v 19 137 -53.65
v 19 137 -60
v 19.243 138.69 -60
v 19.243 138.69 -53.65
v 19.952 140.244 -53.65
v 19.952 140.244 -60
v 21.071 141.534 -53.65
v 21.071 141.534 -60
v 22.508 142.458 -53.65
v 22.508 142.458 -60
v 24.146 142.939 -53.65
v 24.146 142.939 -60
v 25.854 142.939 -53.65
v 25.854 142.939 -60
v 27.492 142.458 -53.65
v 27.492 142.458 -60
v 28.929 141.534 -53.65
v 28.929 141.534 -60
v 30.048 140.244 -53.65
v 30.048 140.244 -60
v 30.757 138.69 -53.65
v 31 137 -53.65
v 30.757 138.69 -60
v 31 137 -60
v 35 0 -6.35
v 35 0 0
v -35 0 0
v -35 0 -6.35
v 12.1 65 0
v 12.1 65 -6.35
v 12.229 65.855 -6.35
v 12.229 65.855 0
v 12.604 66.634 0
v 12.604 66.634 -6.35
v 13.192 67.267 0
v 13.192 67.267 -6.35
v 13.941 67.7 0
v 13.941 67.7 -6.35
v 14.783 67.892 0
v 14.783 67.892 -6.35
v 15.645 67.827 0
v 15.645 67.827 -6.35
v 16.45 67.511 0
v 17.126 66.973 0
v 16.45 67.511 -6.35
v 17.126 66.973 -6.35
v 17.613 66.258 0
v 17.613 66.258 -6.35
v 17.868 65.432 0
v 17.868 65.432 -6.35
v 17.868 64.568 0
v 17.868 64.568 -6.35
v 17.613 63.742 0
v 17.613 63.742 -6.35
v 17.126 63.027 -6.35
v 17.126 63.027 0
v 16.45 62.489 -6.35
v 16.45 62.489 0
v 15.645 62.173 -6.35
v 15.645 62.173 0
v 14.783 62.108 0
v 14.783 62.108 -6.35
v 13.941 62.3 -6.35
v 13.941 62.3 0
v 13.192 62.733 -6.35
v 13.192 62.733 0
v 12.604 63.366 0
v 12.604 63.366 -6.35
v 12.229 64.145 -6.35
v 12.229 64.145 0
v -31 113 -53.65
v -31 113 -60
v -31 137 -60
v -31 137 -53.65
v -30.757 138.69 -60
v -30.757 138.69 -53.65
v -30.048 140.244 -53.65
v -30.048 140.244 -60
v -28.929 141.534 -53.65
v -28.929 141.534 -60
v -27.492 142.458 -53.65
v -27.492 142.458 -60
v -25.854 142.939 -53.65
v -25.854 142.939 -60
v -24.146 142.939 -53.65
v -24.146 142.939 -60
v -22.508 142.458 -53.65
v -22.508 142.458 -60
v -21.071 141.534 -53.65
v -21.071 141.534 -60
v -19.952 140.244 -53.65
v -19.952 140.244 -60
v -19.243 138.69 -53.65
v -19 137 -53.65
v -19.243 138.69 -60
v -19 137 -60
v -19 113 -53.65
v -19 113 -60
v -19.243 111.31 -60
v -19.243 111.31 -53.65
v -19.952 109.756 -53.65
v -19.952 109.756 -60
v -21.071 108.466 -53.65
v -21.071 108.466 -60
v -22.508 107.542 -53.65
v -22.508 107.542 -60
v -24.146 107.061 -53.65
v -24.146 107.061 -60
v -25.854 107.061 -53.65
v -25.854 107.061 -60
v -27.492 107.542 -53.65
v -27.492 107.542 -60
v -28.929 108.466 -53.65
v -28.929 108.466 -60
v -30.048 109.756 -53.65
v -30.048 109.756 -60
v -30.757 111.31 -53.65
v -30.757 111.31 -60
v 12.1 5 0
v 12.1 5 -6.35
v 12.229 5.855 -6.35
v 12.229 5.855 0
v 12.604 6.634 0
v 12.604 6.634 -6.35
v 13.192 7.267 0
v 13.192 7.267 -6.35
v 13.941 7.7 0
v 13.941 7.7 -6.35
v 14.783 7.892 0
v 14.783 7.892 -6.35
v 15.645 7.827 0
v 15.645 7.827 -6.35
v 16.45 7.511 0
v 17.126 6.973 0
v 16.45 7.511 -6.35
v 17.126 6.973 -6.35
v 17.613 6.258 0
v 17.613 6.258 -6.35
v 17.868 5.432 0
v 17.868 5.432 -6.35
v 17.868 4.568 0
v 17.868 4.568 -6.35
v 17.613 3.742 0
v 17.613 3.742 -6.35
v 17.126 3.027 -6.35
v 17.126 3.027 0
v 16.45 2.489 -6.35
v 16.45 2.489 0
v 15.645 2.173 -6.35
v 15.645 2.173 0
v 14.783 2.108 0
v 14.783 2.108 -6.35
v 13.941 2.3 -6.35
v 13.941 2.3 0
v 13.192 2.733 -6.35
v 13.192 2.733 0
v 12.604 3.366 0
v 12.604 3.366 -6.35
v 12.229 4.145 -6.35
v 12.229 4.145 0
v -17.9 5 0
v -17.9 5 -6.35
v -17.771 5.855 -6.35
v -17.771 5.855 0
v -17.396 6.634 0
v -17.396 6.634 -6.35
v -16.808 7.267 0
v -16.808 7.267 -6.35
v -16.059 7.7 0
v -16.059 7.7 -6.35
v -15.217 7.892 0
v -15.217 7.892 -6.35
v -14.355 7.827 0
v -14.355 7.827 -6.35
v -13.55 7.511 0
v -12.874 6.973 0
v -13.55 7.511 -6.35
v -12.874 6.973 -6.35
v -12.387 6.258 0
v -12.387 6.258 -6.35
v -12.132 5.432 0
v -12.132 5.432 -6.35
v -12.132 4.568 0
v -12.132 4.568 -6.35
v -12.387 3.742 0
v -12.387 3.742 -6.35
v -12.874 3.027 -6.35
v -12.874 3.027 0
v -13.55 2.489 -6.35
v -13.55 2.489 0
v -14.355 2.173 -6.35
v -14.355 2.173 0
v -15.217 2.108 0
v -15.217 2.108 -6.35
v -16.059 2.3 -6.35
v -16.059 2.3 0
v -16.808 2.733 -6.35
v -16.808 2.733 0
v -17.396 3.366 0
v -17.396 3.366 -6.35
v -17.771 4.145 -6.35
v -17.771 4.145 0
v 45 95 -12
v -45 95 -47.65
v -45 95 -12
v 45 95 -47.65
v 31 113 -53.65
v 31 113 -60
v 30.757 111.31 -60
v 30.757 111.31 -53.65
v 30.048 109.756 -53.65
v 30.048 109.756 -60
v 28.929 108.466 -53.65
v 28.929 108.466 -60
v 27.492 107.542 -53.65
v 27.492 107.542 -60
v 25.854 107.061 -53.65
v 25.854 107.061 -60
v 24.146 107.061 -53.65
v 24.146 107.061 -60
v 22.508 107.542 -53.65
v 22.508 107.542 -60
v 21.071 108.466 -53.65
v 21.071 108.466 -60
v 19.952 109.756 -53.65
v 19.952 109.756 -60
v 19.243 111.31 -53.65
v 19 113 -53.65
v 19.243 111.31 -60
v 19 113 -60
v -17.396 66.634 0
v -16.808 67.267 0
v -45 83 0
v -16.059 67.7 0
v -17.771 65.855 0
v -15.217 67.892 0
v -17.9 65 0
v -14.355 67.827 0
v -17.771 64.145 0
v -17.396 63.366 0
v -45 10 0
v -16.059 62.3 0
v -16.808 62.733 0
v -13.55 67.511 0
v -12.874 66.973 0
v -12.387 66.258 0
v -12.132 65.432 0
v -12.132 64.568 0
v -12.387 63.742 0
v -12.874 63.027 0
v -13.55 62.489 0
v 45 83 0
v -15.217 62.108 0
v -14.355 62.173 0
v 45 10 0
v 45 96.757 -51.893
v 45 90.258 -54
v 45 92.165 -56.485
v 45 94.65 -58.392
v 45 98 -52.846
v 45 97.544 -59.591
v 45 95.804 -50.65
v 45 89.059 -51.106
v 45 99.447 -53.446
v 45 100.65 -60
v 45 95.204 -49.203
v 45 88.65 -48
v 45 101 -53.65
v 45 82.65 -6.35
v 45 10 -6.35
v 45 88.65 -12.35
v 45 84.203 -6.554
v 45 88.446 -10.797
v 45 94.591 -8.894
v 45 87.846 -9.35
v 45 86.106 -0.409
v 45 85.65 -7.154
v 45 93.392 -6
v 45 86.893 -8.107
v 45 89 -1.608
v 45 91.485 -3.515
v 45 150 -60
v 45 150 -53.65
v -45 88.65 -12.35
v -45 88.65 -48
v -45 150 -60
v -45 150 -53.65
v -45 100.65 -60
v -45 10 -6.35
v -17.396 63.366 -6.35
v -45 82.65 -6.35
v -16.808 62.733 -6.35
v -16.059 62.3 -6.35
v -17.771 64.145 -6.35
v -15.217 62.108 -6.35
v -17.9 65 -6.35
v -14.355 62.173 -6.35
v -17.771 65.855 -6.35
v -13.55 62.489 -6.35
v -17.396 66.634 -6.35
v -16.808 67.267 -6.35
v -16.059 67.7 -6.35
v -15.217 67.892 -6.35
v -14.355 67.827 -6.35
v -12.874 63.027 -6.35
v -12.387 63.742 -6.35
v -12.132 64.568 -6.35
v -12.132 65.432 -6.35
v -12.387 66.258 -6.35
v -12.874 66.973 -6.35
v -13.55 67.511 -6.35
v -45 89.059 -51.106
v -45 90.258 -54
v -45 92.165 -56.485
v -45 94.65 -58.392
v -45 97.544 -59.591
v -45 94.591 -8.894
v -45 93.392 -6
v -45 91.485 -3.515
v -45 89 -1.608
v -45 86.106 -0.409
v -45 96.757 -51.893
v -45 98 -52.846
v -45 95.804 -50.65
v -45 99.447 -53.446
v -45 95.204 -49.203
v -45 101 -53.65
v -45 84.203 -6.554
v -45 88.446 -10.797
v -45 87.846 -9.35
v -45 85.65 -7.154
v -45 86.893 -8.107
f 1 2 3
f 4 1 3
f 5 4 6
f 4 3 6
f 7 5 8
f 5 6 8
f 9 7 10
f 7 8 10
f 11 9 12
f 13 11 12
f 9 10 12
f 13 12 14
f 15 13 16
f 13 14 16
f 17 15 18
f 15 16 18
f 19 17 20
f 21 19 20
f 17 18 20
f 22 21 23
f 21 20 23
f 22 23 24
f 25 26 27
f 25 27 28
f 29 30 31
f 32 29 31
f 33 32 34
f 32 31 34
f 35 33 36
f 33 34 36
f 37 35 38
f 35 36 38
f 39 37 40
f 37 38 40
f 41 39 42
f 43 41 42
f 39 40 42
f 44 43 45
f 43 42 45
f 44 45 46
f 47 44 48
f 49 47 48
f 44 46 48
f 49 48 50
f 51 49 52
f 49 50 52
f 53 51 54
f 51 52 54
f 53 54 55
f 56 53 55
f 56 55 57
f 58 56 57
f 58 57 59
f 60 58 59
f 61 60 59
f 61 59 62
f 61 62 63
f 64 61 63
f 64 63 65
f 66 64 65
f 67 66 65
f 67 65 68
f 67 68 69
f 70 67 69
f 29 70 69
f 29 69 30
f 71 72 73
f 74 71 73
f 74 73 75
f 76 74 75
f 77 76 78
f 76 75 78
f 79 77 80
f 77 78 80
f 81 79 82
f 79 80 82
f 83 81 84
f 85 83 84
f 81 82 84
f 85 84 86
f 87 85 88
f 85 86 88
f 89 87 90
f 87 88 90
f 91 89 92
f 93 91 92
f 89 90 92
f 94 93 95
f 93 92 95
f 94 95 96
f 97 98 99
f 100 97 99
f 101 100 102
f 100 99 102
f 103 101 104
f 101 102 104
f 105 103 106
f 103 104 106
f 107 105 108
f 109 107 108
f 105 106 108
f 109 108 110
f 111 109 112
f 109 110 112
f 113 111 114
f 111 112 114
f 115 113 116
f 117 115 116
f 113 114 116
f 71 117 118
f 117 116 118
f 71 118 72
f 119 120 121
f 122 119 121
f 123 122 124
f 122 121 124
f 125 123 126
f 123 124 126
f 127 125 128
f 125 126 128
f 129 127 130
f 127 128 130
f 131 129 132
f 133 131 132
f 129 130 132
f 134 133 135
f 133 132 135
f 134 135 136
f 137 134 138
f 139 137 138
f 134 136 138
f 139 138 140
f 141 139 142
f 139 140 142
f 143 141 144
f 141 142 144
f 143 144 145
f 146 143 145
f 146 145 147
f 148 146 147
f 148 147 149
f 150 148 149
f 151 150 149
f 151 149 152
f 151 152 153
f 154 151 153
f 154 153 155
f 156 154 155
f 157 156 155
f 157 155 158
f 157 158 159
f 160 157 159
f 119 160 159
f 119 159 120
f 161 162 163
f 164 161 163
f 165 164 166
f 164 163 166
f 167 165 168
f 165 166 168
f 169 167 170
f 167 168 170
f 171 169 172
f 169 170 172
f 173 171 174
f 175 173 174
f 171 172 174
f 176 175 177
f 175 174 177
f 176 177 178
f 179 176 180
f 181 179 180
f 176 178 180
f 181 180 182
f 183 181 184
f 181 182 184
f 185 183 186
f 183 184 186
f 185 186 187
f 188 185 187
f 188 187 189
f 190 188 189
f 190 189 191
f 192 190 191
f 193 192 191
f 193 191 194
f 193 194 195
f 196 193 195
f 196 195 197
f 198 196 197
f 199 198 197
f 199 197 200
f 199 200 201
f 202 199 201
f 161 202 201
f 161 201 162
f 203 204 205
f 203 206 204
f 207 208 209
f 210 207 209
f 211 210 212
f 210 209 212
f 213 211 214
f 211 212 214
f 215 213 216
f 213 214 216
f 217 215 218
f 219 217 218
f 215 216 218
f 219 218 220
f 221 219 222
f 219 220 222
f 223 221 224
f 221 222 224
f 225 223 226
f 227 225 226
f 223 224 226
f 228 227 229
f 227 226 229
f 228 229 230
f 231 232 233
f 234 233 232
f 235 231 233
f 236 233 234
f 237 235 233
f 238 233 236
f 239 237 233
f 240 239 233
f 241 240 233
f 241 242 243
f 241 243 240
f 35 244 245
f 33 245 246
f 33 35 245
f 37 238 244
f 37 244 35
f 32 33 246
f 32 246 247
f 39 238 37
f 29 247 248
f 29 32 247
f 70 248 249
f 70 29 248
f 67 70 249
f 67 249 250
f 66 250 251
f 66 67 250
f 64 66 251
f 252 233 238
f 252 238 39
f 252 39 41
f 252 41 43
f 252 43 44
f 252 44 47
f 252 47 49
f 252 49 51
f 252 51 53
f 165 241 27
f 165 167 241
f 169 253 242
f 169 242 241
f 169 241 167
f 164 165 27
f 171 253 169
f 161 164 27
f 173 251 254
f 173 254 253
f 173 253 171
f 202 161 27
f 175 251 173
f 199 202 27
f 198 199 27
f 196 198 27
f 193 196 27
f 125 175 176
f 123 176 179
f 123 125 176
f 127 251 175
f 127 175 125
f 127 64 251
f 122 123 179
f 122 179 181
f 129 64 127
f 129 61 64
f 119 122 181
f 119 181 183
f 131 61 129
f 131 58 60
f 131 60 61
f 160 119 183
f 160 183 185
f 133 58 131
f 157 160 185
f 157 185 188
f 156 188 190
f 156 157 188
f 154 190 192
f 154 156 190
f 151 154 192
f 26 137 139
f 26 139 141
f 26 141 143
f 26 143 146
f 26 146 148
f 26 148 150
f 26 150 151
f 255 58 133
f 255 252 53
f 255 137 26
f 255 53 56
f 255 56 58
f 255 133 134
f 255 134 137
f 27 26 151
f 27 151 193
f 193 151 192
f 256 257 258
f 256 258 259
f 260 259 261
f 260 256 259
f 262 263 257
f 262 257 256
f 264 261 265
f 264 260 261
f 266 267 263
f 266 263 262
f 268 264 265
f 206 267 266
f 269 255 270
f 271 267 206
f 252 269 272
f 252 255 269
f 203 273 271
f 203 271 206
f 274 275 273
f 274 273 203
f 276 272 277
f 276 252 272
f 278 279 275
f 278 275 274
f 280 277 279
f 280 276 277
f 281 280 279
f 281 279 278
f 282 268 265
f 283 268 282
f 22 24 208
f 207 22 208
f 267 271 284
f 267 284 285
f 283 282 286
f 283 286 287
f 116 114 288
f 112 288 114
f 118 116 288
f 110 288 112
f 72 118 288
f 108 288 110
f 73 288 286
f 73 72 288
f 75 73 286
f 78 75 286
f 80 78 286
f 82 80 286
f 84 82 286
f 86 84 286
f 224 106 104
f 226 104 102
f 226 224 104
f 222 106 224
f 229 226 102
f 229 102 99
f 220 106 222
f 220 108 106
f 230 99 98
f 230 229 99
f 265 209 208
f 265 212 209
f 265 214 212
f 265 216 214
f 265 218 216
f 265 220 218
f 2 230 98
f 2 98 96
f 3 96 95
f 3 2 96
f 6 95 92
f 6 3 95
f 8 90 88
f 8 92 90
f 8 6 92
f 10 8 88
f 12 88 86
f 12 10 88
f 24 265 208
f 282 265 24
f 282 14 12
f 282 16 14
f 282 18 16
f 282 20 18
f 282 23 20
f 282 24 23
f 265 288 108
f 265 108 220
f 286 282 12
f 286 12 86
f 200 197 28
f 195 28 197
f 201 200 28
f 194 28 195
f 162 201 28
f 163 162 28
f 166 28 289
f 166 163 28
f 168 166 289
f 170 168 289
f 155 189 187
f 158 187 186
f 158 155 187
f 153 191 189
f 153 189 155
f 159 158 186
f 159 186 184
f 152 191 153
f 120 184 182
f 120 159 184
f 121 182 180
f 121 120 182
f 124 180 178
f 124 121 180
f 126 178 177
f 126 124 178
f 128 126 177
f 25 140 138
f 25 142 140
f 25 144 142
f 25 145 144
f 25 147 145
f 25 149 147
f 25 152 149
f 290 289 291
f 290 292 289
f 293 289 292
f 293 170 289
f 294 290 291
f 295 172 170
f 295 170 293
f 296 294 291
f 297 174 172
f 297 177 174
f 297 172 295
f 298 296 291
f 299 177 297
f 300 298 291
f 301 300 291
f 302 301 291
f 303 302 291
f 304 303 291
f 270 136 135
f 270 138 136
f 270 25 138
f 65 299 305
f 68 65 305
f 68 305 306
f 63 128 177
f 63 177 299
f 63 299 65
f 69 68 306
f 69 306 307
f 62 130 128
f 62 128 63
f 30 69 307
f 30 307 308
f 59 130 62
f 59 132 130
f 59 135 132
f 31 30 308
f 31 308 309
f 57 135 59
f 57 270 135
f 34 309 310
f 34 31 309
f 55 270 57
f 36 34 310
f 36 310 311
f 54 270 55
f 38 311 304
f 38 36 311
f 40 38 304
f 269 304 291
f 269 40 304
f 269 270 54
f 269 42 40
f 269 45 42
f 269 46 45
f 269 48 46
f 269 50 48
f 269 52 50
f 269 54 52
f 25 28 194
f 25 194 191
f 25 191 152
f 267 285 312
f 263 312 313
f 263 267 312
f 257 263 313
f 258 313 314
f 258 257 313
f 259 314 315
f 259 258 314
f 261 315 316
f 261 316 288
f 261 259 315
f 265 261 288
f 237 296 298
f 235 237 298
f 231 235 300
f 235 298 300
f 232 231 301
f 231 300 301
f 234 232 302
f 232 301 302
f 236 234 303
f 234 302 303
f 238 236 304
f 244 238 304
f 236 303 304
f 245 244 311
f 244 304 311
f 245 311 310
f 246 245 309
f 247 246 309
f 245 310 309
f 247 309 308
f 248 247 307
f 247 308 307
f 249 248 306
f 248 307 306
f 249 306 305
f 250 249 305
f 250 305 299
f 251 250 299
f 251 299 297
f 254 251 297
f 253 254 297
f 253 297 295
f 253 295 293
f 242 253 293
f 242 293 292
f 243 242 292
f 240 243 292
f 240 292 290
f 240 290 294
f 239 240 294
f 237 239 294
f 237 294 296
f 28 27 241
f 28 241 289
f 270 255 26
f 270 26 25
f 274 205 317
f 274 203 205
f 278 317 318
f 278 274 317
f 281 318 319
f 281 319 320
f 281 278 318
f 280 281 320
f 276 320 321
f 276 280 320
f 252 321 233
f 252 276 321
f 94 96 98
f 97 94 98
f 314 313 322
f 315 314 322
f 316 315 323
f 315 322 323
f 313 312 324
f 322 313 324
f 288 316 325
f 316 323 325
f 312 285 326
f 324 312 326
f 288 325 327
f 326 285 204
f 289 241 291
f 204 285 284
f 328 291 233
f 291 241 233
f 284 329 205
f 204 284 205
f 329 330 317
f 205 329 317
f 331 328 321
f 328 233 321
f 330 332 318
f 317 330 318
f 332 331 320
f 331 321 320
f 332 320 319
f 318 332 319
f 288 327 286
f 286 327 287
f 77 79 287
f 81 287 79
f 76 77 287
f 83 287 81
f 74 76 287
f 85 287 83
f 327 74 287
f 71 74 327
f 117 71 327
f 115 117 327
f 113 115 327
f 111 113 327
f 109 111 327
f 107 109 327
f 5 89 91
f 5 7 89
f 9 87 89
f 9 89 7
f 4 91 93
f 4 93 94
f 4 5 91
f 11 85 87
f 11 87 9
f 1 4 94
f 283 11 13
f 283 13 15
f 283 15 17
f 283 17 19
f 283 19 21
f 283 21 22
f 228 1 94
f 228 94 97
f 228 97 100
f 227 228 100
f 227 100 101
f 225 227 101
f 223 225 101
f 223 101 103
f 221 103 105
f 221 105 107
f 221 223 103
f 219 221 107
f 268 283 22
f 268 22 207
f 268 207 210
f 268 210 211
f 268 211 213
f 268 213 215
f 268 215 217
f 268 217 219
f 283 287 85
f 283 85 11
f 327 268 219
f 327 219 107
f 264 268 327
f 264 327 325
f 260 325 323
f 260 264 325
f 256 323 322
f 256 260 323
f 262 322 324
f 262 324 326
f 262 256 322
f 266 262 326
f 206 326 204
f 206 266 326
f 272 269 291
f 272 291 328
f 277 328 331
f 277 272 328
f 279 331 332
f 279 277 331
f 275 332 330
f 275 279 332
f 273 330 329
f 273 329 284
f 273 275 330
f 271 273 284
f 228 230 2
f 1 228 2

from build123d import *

# Parameters (mm, degrees)
F1_DEPTH = 45
F2_SIZE  = 10
F4_D     = 5.8
F6_DEPTH = 60.001


with BuildPart() as f1:
    # F0 (on Right) → F1 (new body, symmetric)
    with BuildSketch(Plane.YZ):
        with BuildLine():
            Line((83, 0), (0, 0))
            Line((0, 0), (0, -6.35))
            Line((0, -6.35), (82.65, -6.35))
            ThreePointArc((82.65, -6.35), (86.8926406871, -8.1073593129), (88.65, -12.35))
            Line((88.65, -12.35), (88.65, -48))
            ThreePointArc((88.65, -48), (92.1647186258, -56.4852813742), (100.65, -60))
            Line((100.65, -60), (150, -60))
            Line((150, -60), (150, -53.65))
            Line((150, -53.65), (101, -53.65))
            ThreePointArc((101, -53.65), (96.7573593129, -51.8926406871), (95, -47.65))
            Line((95, -47.65), (95, -12))
            ThreePointArc((95, -12), (91.4852813742, -3.5147186258), (83, 0))
        make_face()
    extrude(amount=F1_DEPTH, both=True)

    # F2
    f2_edges = [f1.edges().sort_by_distance(p)[0] for p in [
        (45, 0, -3.175),
        (-45, 0, -3.175),
    ]]
    chamfer(f2_edges, length=F2_SIZE)

    # F4 (through all)
    with Locations(Plane.XY):
        with Locations((-15, 5), (-15, 65), (15, 65), (15, 5)):
            Hole(F4_D / 2)

    # F5 (on face) → F6 (cut, through all)
    with BuildSketch(Plane(origin=(0, 0, -60), x_dir=(1, 0, 0), z_dir=(0, 0, -1))):
        with BuildLine():
            ThreePointArc((31, -113), (25, -107), (19, -113))
            Line((19, -113), (19, -125))
            Line((19, -125), (19, -137))
            ThreePointArc((19, -137), (25, -143), (31, -137))
            Line((31, -137), (31, -125))
            Line((31, -125), (31, -113))
        make_face()
        with BuildLine():
            Line((-31, -125), (-31, -137))
            ThreePointArc((-31, -137), (-25, -143), (-19, -137))
            Line((-19, -137), (-19, -125))
            Line((-19, -125), (-19, -113))
            ThreePointArc((-19, -113), (-25, -107), (-31, -113))
            Line((-31, -113), (-31, -125))
        make_face()
    extrude(amount=-F6_DEPTH, mode=Mode.SUBTRACT)


solid = f1.part
